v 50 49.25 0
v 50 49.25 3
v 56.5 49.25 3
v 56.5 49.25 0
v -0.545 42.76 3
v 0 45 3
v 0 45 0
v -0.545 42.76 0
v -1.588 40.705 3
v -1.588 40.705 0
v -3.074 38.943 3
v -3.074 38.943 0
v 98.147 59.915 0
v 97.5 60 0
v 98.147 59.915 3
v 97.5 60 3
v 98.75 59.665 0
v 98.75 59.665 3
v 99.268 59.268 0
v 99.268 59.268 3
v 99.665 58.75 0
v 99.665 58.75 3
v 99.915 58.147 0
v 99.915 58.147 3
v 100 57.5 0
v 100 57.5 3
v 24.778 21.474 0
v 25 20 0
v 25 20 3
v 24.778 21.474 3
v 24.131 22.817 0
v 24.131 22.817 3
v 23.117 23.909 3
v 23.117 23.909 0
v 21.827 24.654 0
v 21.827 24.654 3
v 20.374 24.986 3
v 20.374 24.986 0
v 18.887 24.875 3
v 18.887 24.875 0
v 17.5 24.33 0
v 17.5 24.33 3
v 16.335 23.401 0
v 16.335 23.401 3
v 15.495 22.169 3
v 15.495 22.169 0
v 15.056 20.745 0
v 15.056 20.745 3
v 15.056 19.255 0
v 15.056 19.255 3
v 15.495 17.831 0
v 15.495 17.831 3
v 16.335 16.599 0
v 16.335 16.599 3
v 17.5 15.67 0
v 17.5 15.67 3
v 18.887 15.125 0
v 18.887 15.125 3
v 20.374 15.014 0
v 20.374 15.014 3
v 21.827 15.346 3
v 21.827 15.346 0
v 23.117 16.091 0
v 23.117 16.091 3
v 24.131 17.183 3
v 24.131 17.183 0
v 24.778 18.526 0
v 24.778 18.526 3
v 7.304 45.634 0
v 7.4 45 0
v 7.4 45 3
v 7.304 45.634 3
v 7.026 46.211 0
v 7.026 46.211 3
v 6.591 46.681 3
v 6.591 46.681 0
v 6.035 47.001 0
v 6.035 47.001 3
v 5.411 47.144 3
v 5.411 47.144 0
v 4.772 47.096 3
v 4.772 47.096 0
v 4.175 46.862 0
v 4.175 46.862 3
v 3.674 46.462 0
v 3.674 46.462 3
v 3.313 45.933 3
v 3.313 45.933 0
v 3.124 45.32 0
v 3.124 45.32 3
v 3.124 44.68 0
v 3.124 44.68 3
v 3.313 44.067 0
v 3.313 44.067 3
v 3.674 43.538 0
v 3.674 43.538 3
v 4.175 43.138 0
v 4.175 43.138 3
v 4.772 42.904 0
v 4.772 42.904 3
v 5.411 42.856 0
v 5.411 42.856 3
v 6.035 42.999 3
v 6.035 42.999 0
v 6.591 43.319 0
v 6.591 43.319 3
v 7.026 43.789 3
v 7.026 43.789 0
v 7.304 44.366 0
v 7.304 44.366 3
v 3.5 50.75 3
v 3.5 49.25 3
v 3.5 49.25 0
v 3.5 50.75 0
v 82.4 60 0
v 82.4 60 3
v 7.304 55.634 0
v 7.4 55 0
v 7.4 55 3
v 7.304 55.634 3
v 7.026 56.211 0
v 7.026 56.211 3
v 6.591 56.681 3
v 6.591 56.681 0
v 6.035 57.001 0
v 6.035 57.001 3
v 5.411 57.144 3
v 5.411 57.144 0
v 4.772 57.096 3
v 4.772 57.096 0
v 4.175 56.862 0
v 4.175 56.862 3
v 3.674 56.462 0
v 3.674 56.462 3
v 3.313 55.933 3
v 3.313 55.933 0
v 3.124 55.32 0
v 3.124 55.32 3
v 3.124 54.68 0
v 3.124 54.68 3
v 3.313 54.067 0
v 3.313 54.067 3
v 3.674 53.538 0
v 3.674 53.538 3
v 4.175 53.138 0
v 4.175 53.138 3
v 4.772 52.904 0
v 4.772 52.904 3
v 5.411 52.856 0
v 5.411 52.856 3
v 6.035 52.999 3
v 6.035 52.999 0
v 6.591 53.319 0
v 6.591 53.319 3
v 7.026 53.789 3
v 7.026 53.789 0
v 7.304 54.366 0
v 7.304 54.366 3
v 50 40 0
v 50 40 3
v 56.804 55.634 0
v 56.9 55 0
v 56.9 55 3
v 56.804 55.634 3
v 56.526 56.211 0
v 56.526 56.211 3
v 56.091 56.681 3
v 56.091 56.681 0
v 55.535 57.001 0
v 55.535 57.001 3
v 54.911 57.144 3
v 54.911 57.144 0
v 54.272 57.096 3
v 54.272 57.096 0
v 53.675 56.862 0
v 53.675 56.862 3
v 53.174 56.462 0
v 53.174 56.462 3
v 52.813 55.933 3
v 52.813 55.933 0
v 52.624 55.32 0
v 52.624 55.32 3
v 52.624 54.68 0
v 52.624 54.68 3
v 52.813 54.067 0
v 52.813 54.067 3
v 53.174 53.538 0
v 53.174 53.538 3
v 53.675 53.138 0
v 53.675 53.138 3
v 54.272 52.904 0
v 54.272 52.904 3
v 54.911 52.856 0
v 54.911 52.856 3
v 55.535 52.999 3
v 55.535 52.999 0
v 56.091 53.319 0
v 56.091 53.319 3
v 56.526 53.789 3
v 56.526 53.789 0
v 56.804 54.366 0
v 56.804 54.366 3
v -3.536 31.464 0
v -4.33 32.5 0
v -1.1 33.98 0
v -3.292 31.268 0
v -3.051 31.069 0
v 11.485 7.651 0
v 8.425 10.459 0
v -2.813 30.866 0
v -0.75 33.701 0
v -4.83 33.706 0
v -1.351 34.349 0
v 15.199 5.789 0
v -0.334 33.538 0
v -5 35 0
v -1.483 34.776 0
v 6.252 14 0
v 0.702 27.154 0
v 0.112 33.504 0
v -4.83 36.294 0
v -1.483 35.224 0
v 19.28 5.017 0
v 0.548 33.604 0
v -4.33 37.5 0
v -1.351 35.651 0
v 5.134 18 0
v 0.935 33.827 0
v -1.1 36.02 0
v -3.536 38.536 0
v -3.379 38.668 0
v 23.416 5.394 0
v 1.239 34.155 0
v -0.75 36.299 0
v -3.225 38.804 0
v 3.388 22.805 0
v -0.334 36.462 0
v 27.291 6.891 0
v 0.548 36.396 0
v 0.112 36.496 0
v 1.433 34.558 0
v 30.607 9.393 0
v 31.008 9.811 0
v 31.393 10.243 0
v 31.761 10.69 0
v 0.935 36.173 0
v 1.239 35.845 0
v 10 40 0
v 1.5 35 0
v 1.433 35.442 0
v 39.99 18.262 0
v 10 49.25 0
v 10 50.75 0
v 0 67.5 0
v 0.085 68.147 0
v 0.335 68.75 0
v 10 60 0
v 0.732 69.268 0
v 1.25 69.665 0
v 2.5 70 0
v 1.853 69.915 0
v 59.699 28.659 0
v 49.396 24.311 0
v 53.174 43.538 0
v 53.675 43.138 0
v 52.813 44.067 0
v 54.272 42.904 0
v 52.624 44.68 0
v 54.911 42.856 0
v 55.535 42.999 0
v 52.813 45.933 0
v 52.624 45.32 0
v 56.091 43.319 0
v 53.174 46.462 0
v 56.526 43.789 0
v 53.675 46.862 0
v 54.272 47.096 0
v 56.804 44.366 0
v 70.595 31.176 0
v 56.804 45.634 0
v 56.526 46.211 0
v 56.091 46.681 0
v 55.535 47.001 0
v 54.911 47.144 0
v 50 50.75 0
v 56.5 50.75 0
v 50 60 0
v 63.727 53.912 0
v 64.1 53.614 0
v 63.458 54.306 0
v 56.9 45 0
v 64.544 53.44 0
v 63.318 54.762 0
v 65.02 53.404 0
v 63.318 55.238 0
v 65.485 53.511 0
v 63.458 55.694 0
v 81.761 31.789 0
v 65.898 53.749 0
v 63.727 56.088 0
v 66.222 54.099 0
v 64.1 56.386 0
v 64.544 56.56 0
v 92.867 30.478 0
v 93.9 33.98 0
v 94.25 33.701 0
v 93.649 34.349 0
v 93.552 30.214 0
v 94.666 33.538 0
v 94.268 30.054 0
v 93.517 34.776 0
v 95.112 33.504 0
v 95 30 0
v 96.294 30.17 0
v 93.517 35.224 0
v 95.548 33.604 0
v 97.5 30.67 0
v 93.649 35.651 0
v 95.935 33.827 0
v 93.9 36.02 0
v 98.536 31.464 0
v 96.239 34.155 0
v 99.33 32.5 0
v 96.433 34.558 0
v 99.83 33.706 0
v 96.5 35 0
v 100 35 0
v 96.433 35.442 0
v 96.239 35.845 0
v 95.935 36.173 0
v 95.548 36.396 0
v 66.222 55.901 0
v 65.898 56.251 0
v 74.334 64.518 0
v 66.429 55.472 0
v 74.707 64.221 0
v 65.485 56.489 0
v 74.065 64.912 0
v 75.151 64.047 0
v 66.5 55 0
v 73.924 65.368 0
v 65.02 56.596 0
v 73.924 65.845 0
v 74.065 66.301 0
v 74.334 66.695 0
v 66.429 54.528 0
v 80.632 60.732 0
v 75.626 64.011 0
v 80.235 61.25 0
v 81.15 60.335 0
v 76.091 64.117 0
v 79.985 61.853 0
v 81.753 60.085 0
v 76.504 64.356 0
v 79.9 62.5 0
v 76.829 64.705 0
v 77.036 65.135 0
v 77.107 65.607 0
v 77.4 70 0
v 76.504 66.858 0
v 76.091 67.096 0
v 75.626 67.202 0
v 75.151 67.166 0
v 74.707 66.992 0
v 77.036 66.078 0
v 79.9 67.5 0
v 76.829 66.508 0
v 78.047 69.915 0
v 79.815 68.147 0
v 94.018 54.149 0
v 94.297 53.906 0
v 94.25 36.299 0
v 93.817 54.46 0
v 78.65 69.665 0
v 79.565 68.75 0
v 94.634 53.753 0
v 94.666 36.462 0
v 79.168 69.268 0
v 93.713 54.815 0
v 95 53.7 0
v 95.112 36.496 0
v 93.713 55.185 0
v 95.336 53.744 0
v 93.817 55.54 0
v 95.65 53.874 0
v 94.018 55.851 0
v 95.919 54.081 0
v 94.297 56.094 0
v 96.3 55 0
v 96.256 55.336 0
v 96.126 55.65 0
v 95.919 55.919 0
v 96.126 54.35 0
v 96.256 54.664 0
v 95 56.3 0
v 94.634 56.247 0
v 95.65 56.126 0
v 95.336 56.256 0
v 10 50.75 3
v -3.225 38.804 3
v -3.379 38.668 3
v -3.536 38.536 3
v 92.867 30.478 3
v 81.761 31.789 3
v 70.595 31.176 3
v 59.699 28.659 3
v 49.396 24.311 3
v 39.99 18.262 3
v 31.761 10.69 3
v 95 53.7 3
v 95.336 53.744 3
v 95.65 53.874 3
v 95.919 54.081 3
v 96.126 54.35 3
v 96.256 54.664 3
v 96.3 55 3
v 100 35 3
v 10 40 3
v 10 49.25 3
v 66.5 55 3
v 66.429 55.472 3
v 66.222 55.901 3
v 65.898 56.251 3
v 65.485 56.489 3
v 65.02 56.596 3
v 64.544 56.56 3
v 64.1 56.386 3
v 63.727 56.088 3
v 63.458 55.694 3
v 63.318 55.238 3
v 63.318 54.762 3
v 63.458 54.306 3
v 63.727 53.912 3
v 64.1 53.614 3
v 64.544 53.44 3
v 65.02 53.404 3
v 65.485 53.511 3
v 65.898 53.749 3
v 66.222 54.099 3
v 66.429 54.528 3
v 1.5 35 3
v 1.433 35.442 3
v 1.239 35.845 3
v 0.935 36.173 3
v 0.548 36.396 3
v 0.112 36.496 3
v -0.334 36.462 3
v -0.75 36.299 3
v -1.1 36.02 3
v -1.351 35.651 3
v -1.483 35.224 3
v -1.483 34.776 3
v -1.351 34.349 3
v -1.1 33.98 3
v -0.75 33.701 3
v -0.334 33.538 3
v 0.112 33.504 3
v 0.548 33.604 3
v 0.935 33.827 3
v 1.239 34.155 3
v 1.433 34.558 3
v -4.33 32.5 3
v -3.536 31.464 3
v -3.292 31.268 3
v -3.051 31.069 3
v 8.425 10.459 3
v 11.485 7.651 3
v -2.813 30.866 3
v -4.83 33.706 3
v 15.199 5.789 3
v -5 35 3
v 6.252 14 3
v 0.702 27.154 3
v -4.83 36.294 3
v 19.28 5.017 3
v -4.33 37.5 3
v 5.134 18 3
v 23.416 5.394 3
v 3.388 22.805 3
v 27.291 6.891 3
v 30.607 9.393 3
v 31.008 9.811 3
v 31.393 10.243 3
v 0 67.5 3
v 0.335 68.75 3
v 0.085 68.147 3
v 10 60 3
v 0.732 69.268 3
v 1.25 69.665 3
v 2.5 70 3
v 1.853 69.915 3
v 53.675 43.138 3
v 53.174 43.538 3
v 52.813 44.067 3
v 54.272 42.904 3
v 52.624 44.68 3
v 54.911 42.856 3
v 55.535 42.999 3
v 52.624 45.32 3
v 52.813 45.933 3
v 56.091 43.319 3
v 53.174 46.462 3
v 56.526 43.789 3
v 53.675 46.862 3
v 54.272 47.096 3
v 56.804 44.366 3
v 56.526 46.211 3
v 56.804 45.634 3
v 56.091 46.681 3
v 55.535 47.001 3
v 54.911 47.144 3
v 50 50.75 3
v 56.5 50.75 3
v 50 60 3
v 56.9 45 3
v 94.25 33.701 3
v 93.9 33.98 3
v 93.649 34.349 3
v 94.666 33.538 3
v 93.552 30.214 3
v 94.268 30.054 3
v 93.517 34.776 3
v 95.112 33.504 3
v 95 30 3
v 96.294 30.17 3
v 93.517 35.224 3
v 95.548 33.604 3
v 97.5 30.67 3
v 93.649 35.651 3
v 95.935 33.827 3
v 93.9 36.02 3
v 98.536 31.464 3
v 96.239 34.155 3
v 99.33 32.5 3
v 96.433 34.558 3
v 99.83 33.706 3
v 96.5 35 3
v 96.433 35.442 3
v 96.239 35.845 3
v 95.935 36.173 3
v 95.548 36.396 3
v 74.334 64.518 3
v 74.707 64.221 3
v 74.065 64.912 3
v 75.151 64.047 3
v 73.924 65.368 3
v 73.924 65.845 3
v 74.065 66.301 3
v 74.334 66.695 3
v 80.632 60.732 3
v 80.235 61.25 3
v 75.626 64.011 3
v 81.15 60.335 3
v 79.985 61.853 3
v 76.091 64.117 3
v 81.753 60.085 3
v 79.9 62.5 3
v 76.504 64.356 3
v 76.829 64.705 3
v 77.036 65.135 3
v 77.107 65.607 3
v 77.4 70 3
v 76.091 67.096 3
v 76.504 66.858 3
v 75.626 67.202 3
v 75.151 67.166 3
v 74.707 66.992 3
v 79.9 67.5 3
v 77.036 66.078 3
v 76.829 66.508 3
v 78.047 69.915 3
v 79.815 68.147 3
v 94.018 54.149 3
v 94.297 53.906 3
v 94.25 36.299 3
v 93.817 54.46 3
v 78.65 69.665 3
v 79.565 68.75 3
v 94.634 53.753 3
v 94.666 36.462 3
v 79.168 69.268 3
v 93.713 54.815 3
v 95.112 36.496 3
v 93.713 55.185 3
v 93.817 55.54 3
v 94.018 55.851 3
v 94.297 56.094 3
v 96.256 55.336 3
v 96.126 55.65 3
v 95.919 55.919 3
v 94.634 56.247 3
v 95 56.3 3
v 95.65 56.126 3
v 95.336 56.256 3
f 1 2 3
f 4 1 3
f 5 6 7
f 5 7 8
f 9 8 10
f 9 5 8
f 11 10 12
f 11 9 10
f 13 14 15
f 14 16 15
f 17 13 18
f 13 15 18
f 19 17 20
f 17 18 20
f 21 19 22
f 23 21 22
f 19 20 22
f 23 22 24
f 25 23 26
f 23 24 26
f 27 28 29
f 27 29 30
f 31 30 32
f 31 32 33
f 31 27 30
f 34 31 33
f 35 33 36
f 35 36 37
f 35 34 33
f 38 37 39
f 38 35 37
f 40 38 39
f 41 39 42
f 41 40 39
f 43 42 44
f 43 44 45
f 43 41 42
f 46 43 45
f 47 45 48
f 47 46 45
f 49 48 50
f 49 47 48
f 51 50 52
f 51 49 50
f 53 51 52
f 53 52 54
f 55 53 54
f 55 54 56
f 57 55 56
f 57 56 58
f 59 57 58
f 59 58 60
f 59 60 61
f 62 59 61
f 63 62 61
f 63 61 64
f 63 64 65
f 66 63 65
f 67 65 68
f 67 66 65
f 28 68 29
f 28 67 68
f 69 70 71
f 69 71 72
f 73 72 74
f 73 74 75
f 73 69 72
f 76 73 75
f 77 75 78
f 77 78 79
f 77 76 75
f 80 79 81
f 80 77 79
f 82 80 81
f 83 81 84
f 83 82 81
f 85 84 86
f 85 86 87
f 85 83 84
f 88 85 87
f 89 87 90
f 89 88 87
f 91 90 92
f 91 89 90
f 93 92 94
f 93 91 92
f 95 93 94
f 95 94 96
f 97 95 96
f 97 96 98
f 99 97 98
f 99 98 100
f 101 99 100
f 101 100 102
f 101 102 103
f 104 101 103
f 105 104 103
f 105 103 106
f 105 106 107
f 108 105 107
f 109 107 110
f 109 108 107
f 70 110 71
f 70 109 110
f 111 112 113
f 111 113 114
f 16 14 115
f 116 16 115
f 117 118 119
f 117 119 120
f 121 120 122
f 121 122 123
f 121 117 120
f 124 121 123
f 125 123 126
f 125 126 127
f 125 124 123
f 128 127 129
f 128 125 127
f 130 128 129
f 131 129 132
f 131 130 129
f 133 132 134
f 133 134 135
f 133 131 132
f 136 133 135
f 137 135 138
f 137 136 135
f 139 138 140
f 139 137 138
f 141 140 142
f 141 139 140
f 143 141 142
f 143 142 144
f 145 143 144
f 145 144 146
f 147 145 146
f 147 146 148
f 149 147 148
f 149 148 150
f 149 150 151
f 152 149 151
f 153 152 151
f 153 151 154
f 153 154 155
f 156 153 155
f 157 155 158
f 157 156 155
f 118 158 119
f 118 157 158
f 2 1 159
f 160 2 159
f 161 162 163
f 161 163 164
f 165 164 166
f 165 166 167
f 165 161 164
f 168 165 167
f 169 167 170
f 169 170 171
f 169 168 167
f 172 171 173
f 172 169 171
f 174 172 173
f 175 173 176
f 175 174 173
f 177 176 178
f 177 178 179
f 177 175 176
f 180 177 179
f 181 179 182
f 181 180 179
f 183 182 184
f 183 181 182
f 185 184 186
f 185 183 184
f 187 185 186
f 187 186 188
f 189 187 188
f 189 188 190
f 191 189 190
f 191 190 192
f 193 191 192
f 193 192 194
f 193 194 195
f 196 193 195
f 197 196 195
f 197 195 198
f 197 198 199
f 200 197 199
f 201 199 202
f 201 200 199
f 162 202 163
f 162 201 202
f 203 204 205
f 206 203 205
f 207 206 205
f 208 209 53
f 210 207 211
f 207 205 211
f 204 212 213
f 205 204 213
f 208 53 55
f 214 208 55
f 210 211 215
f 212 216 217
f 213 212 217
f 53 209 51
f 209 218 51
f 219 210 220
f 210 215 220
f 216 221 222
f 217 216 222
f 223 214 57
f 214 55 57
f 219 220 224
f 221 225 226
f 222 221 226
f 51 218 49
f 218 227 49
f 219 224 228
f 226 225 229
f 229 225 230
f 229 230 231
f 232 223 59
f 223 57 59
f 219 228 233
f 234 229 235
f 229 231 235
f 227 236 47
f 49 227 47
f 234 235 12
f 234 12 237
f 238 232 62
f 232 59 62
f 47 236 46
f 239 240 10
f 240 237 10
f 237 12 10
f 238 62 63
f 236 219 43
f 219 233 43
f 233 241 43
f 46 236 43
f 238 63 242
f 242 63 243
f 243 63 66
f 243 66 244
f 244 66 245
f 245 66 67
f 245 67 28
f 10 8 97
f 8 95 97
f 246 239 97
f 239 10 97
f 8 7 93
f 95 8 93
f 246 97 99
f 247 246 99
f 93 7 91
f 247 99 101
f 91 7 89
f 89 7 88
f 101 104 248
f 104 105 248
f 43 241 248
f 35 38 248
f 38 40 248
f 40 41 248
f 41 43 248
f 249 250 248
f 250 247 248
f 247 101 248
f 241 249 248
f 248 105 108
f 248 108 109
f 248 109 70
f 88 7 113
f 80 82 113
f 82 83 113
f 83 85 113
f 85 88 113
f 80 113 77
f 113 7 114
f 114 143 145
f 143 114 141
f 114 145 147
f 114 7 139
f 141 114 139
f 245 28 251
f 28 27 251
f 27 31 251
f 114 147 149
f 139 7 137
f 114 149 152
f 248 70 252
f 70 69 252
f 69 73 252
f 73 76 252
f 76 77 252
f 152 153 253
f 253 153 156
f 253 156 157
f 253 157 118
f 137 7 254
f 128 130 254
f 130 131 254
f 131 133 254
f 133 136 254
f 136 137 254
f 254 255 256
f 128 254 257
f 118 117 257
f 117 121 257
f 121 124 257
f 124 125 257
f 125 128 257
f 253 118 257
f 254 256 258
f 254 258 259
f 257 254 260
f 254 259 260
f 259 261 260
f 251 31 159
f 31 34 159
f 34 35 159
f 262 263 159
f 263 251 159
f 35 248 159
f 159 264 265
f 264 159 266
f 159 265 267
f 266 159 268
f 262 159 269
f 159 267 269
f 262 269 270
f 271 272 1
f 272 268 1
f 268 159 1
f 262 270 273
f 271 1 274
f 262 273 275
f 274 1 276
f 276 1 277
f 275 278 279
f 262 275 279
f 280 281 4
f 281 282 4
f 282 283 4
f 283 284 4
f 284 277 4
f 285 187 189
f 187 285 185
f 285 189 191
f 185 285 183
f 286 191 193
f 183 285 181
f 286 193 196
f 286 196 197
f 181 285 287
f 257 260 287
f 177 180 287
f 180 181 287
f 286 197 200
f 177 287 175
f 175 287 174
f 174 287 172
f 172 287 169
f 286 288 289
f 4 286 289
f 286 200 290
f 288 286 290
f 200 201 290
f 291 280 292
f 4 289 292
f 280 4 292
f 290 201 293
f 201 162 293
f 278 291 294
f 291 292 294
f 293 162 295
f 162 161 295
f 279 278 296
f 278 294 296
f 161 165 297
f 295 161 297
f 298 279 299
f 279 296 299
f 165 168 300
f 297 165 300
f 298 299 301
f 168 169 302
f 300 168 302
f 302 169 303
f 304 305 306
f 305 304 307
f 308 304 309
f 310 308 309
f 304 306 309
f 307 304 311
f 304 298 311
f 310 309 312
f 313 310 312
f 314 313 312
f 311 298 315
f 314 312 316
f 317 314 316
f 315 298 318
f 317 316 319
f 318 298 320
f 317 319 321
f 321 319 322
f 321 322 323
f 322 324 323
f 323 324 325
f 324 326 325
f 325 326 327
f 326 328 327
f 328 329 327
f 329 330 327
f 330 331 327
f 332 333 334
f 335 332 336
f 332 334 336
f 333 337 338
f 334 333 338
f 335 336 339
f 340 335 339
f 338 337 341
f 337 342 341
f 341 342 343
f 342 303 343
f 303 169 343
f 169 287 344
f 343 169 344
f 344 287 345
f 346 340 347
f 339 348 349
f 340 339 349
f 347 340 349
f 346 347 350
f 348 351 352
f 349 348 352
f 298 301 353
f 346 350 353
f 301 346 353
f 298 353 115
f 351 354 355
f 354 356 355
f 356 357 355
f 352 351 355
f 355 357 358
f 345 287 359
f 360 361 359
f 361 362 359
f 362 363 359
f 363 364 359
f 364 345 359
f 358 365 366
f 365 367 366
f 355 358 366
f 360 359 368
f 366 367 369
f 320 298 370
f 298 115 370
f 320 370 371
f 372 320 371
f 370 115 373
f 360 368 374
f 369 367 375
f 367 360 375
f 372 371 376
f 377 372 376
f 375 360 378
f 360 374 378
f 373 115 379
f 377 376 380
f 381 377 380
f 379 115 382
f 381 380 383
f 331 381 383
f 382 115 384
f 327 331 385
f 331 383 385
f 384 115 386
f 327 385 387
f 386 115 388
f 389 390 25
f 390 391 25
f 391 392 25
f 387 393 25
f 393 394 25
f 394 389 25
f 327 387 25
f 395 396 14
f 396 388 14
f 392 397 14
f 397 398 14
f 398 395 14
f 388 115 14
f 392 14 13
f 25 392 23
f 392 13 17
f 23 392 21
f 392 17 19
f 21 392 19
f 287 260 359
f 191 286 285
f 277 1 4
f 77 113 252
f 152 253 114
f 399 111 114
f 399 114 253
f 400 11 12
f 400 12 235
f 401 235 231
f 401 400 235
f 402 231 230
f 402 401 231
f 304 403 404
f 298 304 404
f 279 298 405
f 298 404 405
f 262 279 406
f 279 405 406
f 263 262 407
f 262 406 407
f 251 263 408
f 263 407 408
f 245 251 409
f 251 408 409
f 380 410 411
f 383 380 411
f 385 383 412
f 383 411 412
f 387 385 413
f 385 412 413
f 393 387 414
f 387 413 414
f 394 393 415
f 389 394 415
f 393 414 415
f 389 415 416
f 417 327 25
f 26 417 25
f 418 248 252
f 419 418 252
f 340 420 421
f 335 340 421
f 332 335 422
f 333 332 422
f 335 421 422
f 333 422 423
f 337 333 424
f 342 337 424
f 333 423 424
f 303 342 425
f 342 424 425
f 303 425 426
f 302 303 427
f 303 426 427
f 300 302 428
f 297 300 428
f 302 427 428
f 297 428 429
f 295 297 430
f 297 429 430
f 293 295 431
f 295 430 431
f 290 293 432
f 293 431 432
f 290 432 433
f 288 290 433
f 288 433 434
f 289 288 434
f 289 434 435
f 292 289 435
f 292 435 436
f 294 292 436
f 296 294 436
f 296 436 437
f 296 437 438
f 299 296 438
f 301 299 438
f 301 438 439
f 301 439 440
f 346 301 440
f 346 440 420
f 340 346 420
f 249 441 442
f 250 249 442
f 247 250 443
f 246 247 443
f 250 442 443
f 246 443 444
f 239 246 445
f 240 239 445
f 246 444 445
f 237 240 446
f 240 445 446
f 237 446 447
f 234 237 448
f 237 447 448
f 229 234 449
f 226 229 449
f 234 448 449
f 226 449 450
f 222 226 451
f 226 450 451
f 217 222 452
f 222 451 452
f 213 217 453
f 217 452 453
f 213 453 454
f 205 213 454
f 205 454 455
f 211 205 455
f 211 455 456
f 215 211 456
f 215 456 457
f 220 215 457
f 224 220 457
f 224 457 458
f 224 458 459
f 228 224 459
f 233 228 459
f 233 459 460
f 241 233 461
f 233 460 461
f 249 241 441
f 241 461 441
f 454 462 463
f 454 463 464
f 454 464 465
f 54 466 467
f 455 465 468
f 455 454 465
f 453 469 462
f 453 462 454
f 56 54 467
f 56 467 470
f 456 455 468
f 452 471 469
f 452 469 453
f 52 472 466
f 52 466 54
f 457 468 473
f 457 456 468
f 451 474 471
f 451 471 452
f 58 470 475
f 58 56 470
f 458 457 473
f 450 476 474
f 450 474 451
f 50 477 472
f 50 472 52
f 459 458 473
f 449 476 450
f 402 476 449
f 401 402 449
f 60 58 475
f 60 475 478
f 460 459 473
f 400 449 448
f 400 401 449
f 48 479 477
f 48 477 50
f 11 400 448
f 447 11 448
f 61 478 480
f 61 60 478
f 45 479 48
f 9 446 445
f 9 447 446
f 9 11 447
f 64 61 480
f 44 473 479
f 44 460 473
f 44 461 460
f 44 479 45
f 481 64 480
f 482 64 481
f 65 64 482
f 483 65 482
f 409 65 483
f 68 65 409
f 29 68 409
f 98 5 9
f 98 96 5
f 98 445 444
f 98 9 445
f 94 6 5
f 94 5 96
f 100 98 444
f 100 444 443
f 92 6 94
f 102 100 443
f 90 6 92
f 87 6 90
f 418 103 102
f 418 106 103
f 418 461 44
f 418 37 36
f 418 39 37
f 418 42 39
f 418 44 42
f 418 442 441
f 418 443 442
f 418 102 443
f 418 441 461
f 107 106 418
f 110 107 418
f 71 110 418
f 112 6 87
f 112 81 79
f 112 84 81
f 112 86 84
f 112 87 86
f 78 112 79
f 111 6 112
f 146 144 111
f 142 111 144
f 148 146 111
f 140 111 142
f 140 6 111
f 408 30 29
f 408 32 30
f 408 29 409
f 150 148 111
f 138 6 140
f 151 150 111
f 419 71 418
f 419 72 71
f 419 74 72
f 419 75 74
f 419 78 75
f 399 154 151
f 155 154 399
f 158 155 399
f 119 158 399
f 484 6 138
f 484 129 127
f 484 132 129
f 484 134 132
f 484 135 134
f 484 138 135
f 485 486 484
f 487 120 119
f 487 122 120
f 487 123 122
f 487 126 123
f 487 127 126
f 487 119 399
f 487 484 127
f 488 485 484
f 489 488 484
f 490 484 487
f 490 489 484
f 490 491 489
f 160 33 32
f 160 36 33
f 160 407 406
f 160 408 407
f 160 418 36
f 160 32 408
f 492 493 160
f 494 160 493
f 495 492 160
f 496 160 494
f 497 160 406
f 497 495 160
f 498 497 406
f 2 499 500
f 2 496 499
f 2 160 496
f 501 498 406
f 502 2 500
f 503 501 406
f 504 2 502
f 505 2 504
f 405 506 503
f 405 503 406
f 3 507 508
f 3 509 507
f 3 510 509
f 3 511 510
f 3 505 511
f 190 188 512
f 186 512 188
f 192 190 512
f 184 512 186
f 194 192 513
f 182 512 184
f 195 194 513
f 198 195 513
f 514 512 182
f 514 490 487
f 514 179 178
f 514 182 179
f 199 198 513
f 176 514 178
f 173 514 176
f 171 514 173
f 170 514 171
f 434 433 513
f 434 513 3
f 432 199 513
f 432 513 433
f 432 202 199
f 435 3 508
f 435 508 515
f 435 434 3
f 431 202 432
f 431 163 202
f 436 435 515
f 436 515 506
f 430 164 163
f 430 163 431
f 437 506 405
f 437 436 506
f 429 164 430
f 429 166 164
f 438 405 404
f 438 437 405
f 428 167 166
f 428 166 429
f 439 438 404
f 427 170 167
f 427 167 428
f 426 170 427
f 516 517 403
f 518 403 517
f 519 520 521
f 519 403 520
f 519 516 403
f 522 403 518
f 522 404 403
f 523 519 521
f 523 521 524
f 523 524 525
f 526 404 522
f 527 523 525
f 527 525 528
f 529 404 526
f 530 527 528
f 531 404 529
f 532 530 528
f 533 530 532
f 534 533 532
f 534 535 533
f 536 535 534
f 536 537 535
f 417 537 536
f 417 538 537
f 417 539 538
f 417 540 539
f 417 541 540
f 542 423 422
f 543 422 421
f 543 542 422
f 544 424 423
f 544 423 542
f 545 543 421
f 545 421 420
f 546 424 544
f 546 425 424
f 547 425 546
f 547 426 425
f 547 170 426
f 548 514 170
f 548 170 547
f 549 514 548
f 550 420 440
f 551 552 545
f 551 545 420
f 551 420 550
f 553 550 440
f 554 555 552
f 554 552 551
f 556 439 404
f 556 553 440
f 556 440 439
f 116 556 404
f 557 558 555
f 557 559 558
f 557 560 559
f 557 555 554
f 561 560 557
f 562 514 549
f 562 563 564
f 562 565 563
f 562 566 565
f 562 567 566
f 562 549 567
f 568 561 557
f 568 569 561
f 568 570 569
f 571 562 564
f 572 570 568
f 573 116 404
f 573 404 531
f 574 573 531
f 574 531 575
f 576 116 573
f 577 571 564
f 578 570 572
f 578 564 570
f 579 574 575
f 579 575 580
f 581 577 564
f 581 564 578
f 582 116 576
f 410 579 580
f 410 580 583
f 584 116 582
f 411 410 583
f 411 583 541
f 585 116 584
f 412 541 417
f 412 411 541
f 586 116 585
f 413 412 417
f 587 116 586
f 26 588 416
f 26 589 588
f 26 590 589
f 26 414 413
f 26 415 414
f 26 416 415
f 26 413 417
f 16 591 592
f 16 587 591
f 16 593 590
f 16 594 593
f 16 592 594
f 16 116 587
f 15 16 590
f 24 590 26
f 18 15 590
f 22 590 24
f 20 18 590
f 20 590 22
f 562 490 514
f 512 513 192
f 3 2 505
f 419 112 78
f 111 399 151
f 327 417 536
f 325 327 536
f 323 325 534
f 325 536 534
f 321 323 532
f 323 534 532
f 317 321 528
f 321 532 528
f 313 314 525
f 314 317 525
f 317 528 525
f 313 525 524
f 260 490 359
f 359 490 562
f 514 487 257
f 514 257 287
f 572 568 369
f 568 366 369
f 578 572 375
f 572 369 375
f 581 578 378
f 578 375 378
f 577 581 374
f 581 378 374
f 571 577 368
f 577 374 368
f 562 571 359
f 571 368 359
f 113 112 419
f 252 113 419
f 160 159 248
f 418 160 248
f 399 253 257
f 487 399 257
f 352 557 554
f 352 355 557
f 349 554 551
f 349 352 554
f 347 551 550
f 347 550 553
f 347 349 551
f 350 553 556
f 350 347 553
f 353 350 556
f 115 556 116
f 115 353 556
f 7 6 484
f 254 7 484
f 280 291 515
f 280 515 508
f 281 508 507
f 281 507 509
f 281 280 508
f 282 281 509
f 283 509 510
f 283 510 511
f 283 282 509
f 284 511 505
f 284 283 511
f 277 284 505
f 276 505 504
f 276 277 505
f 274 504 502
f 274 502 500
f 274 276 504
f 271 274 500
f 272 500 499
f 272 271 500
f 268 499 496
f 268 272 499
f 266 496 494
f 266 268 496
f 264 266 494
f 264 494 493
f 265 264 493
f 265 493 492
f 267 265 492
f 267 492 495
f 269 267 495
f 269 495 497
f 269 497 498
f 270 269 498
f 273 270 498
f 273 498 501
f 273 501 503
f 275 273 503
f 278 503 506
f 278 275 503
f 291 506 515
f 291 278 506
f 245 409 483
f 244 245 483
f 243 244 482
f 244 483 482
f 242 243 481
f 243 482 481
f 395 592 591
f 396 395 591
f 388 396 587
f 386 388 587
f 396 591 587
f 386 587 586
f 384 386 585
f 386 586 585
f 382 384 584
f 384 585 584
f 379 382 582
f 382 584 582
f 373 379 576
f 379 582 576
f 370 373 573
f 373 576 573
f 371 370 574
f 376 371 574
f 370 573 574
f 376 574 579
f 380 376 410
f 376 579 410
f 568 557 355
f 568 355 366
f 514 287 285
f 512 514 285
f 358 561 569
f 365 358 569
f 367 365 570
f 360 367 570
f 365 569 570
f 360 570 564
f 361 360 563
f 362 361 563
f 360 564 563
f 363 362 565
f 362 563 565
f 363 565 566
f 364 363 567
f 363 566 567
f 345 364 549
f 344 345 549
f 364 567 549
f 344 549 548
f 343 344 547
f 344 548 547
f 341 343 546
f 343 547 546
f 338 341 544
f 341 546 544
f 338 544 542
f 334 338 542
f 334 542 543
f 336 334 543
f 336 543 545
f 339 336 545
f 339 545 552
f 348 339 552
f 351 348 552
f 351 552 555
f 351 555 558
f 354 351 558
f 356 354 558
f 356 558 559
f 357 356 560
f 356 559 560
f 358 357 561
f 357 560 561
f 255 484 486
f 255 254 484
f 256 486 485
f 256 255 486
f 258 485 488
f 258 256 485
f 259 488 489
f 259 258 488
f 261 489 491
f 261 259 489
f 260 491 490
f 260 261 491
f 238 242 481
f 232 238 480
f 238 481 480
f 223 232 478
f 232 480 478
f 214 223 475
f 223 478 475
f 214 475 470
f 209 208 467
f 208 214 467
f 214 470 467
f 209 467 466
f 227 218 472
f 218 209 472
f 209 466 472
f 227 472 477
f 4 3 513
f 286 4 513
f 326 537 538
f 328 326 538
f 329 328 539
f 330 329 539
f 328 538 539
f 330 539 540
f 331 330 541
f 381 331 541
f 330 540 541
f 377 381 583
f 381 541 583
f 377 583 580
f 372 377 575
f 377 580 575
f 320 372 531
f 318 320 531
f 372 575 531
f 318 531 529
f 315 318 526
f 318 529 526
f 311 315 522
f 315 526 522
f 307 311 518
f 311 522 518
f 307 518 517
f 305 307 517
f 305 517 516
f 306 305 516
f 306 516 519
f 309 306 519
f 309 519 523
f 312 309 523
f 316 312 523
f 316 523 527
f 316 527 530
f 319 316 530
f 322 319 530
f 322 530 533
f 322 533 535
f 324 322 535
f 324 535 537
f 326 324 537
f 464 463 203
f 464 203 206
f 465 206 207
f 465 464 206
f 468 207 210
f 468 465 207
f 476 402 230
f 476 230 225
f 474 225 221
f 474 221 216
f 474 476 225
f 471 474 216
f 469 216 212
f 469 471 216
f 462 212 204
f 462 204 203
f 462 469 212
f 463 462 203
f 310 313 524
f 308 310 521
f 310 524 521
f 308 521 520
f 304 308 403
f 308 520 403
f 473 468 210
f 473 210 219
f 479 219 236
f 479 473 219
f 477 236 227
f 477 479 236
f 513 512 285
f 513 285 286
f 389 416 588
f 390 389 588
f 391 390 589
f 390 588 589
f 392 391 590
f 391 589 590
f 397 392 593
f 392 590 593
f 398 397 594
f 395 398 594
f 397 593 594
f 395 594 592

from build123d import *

# Parameters (mm, degrees)
SKETCH_1_R          = 5
SKETCH_1_R_2        = 2.15
EXTRUDE_1_DEPTH     = 3
SKETCH_2_R          = 1.5
CUT_EXTRUDE_1_DEPTH = 117.657618697
CUT_EXTRUDE_3_DEPTH = 117.657618697
SKETCH_5_R          = 1.5
EXTRUDE_3_DEPTH     = 3
CUT_EXTRUDE_4_DEPTH = 117.657618697
SKETCH_7_R          = 1.6
CUT_EXTRUDE_6_DEPTH = 117.657618697
SKETCH_8_W          = 53
SKETCH_8_H          = 1.5
CUT_EXTRUDE_7_DEPTH = 117.657618697
SKETCH_9_W          = 79.9
SKETCH_9_H          = 10
SKETCH_9_R          = 1.6
EXTRUDE_4_DEPTH     = 3
FILLET_1_R          = 2.5


with BuildPart() as part:
    # ｽｹｯﾁ1 → ﾎﾞｽ - 押し出し1 (new body)
    with BuildSketch(Plane.XY):
        Polygon((10, 60), (0, 60), (0, 0), (100, 0), (100, 50), (100, 60), (50, 60), (50, 40), (10, 40), align=None)
        with Locations((20, 20)):
            Circle(SKETCH_1_R, mode=Mode.SUBTRACT)
        with Locations((5.25, 45)):
            Circle(SKETCH_1_R_2, mode=Mode.SUBTRACT)
        with Locations((5.25, 55)):
            Circle(SKETCH_1_R_2, mode=Mode.SUBTRACT)
        with Locations((54.75, 45)):
            Circle(SKETCH_1_R_2, mode=Mode.SUBTRACT)
        with Locations((54.75, 55)):
            Circle(SKETCH_1_R_2, mode=Mode.SUBTRACT)
    extrude(amount=EXTRUDE_1_DEPTH)

    # ｽｹｯﾁ2 → ｶｯﾄ - 押し出し1 (cut, through all)
    with BuildSketch(Plane.XY.offset(3)):
        with Locations((95, 35)):
            Circle(SKETCH_2_R)
    extrude(amount=-CUT_EXTRUDE_1_DEPTH, mode=Mode.SUBTRACT)

    # ｽｹｯﾁ4 → ｶｯﾄ - 押し出し3 (cut, through all)
    with BuildSketch(Plane.XY.offset(3)):
        with BuildLine():
            ThreePointArc((30.606601718, 9.393398282), (11.666446505, 7.527955815), (6.141807012, 25.740251485))
            ThreePointArc((6.141807012, 25.740251485), (5.992593584, 34.011854082), (1.731818145, 41.103219734))
            ThreePointArc((1.731818145, 41.103219734), (1.633577382, 41.194216579), (1.537689399, 41.287689399))
            ThreePointArc((1.537689399, 41.287689399), (0.399632454, 42.99091198), (0, 45))
            Line((0, 45), (0, 0))
            Line((0, 0), (100, 0))
            Line((100, 0), (100, 35))
            ThreePointArc((100, 35), (98.535533906, 31.464466094), (95, 30))
            ThreePointArc((95, 30), (93.906844507, 30.120962075), (92.866581158, 30.477995572))
            ThreePointArc((92.866581158, 30.477995572), (59.698938801, 28.658859349), (31.76111788, 10.689999666))
            ThreePointArc((31.76111788, 10.689999666), (31.202634234, 10.024981894), (30.606601718, 9.393398282))
        make_face()
    extrude(amount=-CUT_EXTRUDE_3_DEPTH, mode=Mode.SUBTRACT)

    # ｽｹｯﾁ5 → ﾎﾞｽ - 押し出し3 (add, through all)
    # profile 1 of 2: a face of its own
    with BuildSketch(Plane.XY.offset(3)):
        with BuildLine():
            ThreePointArc((-3.074339462, 38.943150628), (-3.301799792, 38.735793058), (-3.535533906, 38.535533906))
            ThreePointArc((-3.535533906, 38.535533906), (-5, 35), (-3.535533906, 31.464466094))
            ThreePointArc((-3.535533906, 31.464466094), (-3.171489153, 31.168816808), (-2.813054288, 30.866390733))
            ThreePointArc((-2.813054288, 30.866390733), (2.338239569, 30.580425844), (5, 35))
            ThreePointArc((5, 35), (2.194117441, 39.492866419), (-3.074339462, 38.943150628))
        make_face()
        with Locations((0, 35)):
            Circle(SKETCH_5_R, mode=Mode.SUBTRACT)
    # profile 2 of 2: a face of its own
    with BuildSketch(Plane.XY.offset(3)):
        with BuildLine():
            ThreePointArc((0, 45), (-1.007160055, 41.702552665), (-3.074339462, 38.943150628))
            ThreePointArc((-3.074339462, 38.943150628), (2.194117441, 39.492866419), (5, 35))
            ThreePointArc((5, 35), (2.338239569, 30.580425844), (-2.813054288, 30.866390733))
            ThreePointArc((-2.813054288, 30.866390733), (2.156646174, 25.048507639), (5.133931253, 18))
            ThreePointArc((5.133931253, 18), (5.125569714, 21.936833416), (6.141807012, 25.740251485))
            ThreePointArc((6.141807012, 25.740251485), (5.992593584, 34.011854082), (1.731818145, 41.103219734))
            ThreePointArc((1.731818145, 41.103219734), (0.4524509, 42.867859613), (0, 45))
        make_face()
    extrude(amount=-EXTRUDE_3_DEPTH)

    # ｽｹｯﾁ6 → ｶｯﾄ - 押し出し4 (cut, through all)
    with BuildSketch(Plane.XY.offset(3)):
        with BuildLine():
            ThreePointArc((96.3, 55), (95.919238816, 55.919238816), (95, 56.3))
            Line((95, 56.3), (95, 53.7))
            ThreePointArc((95, 53.7), (95.919238816, 54.080761184), (96.3, 55))
        make_face()
        with BuildLine():
            Line((95, 53.7), (95, 56.3))
            ThreePointArc((95, 56.3), (93.7, 55), (95, 53.7))
        make_face()
    extrude(amount=-CUT_EXTRUDE_4_DEPTH, mode=Mode.SUBTRACT)

    # ｽｹｯﾁ7 → ｶｯﾄ - 押し出し6 (cut, through all)
    with BuildSketch(Plane.XY.offset(3)):
        with Locations((64.9, 55)):
            Circle(SKETCH_7_R)
    extrude(amount=-CUT_EXTRUDE_6_DEPTH, mode=Mode.SUBTRACT)

    # ｽｹｯﾁ8 → ｶｯﾄ - 押し出し7 (cut, through all)
    with BuildSketch(Plane.XY.offset(3)):
        with Locations((30, 50)):
            Rectangle(SKETCH_8_W, SKETCH_8_H)
    extrude(amount=-CUT_EXTRUDE_7_DEPTH, mode=Mode.SUBTRACT)

    # ｽｹｯﾁ9 → ﾎﾞｽ - 押し出し4 (add, through all)
    with BuildSketch(Plane.XY.offset(3)):
        with Locations((39.95, 65)):
            Rectangle(SKETCH_9_W, SKETCH_9_H)
        with Locations((75.506601718, 65.606601718)):
            Circle(SKETCH_9_R, mode=Mode.SUBTRACT)
    extrude(amount=-EXTRUDE_4_DEPTH)

    # ﾌｨﾚｯﾄ1
    fillet_1_edges = [part.edges().sort_by_distance(p)[0] for p in [
        (0, 70, 1.5),
        (79.9, 70, 1.5),
        (79.9, 60, 1.5),
        (100, 60, 1.5),
    ]]
    fillet(fillet_1_edges, radius=FILLET_1_R)


solid = part.part
